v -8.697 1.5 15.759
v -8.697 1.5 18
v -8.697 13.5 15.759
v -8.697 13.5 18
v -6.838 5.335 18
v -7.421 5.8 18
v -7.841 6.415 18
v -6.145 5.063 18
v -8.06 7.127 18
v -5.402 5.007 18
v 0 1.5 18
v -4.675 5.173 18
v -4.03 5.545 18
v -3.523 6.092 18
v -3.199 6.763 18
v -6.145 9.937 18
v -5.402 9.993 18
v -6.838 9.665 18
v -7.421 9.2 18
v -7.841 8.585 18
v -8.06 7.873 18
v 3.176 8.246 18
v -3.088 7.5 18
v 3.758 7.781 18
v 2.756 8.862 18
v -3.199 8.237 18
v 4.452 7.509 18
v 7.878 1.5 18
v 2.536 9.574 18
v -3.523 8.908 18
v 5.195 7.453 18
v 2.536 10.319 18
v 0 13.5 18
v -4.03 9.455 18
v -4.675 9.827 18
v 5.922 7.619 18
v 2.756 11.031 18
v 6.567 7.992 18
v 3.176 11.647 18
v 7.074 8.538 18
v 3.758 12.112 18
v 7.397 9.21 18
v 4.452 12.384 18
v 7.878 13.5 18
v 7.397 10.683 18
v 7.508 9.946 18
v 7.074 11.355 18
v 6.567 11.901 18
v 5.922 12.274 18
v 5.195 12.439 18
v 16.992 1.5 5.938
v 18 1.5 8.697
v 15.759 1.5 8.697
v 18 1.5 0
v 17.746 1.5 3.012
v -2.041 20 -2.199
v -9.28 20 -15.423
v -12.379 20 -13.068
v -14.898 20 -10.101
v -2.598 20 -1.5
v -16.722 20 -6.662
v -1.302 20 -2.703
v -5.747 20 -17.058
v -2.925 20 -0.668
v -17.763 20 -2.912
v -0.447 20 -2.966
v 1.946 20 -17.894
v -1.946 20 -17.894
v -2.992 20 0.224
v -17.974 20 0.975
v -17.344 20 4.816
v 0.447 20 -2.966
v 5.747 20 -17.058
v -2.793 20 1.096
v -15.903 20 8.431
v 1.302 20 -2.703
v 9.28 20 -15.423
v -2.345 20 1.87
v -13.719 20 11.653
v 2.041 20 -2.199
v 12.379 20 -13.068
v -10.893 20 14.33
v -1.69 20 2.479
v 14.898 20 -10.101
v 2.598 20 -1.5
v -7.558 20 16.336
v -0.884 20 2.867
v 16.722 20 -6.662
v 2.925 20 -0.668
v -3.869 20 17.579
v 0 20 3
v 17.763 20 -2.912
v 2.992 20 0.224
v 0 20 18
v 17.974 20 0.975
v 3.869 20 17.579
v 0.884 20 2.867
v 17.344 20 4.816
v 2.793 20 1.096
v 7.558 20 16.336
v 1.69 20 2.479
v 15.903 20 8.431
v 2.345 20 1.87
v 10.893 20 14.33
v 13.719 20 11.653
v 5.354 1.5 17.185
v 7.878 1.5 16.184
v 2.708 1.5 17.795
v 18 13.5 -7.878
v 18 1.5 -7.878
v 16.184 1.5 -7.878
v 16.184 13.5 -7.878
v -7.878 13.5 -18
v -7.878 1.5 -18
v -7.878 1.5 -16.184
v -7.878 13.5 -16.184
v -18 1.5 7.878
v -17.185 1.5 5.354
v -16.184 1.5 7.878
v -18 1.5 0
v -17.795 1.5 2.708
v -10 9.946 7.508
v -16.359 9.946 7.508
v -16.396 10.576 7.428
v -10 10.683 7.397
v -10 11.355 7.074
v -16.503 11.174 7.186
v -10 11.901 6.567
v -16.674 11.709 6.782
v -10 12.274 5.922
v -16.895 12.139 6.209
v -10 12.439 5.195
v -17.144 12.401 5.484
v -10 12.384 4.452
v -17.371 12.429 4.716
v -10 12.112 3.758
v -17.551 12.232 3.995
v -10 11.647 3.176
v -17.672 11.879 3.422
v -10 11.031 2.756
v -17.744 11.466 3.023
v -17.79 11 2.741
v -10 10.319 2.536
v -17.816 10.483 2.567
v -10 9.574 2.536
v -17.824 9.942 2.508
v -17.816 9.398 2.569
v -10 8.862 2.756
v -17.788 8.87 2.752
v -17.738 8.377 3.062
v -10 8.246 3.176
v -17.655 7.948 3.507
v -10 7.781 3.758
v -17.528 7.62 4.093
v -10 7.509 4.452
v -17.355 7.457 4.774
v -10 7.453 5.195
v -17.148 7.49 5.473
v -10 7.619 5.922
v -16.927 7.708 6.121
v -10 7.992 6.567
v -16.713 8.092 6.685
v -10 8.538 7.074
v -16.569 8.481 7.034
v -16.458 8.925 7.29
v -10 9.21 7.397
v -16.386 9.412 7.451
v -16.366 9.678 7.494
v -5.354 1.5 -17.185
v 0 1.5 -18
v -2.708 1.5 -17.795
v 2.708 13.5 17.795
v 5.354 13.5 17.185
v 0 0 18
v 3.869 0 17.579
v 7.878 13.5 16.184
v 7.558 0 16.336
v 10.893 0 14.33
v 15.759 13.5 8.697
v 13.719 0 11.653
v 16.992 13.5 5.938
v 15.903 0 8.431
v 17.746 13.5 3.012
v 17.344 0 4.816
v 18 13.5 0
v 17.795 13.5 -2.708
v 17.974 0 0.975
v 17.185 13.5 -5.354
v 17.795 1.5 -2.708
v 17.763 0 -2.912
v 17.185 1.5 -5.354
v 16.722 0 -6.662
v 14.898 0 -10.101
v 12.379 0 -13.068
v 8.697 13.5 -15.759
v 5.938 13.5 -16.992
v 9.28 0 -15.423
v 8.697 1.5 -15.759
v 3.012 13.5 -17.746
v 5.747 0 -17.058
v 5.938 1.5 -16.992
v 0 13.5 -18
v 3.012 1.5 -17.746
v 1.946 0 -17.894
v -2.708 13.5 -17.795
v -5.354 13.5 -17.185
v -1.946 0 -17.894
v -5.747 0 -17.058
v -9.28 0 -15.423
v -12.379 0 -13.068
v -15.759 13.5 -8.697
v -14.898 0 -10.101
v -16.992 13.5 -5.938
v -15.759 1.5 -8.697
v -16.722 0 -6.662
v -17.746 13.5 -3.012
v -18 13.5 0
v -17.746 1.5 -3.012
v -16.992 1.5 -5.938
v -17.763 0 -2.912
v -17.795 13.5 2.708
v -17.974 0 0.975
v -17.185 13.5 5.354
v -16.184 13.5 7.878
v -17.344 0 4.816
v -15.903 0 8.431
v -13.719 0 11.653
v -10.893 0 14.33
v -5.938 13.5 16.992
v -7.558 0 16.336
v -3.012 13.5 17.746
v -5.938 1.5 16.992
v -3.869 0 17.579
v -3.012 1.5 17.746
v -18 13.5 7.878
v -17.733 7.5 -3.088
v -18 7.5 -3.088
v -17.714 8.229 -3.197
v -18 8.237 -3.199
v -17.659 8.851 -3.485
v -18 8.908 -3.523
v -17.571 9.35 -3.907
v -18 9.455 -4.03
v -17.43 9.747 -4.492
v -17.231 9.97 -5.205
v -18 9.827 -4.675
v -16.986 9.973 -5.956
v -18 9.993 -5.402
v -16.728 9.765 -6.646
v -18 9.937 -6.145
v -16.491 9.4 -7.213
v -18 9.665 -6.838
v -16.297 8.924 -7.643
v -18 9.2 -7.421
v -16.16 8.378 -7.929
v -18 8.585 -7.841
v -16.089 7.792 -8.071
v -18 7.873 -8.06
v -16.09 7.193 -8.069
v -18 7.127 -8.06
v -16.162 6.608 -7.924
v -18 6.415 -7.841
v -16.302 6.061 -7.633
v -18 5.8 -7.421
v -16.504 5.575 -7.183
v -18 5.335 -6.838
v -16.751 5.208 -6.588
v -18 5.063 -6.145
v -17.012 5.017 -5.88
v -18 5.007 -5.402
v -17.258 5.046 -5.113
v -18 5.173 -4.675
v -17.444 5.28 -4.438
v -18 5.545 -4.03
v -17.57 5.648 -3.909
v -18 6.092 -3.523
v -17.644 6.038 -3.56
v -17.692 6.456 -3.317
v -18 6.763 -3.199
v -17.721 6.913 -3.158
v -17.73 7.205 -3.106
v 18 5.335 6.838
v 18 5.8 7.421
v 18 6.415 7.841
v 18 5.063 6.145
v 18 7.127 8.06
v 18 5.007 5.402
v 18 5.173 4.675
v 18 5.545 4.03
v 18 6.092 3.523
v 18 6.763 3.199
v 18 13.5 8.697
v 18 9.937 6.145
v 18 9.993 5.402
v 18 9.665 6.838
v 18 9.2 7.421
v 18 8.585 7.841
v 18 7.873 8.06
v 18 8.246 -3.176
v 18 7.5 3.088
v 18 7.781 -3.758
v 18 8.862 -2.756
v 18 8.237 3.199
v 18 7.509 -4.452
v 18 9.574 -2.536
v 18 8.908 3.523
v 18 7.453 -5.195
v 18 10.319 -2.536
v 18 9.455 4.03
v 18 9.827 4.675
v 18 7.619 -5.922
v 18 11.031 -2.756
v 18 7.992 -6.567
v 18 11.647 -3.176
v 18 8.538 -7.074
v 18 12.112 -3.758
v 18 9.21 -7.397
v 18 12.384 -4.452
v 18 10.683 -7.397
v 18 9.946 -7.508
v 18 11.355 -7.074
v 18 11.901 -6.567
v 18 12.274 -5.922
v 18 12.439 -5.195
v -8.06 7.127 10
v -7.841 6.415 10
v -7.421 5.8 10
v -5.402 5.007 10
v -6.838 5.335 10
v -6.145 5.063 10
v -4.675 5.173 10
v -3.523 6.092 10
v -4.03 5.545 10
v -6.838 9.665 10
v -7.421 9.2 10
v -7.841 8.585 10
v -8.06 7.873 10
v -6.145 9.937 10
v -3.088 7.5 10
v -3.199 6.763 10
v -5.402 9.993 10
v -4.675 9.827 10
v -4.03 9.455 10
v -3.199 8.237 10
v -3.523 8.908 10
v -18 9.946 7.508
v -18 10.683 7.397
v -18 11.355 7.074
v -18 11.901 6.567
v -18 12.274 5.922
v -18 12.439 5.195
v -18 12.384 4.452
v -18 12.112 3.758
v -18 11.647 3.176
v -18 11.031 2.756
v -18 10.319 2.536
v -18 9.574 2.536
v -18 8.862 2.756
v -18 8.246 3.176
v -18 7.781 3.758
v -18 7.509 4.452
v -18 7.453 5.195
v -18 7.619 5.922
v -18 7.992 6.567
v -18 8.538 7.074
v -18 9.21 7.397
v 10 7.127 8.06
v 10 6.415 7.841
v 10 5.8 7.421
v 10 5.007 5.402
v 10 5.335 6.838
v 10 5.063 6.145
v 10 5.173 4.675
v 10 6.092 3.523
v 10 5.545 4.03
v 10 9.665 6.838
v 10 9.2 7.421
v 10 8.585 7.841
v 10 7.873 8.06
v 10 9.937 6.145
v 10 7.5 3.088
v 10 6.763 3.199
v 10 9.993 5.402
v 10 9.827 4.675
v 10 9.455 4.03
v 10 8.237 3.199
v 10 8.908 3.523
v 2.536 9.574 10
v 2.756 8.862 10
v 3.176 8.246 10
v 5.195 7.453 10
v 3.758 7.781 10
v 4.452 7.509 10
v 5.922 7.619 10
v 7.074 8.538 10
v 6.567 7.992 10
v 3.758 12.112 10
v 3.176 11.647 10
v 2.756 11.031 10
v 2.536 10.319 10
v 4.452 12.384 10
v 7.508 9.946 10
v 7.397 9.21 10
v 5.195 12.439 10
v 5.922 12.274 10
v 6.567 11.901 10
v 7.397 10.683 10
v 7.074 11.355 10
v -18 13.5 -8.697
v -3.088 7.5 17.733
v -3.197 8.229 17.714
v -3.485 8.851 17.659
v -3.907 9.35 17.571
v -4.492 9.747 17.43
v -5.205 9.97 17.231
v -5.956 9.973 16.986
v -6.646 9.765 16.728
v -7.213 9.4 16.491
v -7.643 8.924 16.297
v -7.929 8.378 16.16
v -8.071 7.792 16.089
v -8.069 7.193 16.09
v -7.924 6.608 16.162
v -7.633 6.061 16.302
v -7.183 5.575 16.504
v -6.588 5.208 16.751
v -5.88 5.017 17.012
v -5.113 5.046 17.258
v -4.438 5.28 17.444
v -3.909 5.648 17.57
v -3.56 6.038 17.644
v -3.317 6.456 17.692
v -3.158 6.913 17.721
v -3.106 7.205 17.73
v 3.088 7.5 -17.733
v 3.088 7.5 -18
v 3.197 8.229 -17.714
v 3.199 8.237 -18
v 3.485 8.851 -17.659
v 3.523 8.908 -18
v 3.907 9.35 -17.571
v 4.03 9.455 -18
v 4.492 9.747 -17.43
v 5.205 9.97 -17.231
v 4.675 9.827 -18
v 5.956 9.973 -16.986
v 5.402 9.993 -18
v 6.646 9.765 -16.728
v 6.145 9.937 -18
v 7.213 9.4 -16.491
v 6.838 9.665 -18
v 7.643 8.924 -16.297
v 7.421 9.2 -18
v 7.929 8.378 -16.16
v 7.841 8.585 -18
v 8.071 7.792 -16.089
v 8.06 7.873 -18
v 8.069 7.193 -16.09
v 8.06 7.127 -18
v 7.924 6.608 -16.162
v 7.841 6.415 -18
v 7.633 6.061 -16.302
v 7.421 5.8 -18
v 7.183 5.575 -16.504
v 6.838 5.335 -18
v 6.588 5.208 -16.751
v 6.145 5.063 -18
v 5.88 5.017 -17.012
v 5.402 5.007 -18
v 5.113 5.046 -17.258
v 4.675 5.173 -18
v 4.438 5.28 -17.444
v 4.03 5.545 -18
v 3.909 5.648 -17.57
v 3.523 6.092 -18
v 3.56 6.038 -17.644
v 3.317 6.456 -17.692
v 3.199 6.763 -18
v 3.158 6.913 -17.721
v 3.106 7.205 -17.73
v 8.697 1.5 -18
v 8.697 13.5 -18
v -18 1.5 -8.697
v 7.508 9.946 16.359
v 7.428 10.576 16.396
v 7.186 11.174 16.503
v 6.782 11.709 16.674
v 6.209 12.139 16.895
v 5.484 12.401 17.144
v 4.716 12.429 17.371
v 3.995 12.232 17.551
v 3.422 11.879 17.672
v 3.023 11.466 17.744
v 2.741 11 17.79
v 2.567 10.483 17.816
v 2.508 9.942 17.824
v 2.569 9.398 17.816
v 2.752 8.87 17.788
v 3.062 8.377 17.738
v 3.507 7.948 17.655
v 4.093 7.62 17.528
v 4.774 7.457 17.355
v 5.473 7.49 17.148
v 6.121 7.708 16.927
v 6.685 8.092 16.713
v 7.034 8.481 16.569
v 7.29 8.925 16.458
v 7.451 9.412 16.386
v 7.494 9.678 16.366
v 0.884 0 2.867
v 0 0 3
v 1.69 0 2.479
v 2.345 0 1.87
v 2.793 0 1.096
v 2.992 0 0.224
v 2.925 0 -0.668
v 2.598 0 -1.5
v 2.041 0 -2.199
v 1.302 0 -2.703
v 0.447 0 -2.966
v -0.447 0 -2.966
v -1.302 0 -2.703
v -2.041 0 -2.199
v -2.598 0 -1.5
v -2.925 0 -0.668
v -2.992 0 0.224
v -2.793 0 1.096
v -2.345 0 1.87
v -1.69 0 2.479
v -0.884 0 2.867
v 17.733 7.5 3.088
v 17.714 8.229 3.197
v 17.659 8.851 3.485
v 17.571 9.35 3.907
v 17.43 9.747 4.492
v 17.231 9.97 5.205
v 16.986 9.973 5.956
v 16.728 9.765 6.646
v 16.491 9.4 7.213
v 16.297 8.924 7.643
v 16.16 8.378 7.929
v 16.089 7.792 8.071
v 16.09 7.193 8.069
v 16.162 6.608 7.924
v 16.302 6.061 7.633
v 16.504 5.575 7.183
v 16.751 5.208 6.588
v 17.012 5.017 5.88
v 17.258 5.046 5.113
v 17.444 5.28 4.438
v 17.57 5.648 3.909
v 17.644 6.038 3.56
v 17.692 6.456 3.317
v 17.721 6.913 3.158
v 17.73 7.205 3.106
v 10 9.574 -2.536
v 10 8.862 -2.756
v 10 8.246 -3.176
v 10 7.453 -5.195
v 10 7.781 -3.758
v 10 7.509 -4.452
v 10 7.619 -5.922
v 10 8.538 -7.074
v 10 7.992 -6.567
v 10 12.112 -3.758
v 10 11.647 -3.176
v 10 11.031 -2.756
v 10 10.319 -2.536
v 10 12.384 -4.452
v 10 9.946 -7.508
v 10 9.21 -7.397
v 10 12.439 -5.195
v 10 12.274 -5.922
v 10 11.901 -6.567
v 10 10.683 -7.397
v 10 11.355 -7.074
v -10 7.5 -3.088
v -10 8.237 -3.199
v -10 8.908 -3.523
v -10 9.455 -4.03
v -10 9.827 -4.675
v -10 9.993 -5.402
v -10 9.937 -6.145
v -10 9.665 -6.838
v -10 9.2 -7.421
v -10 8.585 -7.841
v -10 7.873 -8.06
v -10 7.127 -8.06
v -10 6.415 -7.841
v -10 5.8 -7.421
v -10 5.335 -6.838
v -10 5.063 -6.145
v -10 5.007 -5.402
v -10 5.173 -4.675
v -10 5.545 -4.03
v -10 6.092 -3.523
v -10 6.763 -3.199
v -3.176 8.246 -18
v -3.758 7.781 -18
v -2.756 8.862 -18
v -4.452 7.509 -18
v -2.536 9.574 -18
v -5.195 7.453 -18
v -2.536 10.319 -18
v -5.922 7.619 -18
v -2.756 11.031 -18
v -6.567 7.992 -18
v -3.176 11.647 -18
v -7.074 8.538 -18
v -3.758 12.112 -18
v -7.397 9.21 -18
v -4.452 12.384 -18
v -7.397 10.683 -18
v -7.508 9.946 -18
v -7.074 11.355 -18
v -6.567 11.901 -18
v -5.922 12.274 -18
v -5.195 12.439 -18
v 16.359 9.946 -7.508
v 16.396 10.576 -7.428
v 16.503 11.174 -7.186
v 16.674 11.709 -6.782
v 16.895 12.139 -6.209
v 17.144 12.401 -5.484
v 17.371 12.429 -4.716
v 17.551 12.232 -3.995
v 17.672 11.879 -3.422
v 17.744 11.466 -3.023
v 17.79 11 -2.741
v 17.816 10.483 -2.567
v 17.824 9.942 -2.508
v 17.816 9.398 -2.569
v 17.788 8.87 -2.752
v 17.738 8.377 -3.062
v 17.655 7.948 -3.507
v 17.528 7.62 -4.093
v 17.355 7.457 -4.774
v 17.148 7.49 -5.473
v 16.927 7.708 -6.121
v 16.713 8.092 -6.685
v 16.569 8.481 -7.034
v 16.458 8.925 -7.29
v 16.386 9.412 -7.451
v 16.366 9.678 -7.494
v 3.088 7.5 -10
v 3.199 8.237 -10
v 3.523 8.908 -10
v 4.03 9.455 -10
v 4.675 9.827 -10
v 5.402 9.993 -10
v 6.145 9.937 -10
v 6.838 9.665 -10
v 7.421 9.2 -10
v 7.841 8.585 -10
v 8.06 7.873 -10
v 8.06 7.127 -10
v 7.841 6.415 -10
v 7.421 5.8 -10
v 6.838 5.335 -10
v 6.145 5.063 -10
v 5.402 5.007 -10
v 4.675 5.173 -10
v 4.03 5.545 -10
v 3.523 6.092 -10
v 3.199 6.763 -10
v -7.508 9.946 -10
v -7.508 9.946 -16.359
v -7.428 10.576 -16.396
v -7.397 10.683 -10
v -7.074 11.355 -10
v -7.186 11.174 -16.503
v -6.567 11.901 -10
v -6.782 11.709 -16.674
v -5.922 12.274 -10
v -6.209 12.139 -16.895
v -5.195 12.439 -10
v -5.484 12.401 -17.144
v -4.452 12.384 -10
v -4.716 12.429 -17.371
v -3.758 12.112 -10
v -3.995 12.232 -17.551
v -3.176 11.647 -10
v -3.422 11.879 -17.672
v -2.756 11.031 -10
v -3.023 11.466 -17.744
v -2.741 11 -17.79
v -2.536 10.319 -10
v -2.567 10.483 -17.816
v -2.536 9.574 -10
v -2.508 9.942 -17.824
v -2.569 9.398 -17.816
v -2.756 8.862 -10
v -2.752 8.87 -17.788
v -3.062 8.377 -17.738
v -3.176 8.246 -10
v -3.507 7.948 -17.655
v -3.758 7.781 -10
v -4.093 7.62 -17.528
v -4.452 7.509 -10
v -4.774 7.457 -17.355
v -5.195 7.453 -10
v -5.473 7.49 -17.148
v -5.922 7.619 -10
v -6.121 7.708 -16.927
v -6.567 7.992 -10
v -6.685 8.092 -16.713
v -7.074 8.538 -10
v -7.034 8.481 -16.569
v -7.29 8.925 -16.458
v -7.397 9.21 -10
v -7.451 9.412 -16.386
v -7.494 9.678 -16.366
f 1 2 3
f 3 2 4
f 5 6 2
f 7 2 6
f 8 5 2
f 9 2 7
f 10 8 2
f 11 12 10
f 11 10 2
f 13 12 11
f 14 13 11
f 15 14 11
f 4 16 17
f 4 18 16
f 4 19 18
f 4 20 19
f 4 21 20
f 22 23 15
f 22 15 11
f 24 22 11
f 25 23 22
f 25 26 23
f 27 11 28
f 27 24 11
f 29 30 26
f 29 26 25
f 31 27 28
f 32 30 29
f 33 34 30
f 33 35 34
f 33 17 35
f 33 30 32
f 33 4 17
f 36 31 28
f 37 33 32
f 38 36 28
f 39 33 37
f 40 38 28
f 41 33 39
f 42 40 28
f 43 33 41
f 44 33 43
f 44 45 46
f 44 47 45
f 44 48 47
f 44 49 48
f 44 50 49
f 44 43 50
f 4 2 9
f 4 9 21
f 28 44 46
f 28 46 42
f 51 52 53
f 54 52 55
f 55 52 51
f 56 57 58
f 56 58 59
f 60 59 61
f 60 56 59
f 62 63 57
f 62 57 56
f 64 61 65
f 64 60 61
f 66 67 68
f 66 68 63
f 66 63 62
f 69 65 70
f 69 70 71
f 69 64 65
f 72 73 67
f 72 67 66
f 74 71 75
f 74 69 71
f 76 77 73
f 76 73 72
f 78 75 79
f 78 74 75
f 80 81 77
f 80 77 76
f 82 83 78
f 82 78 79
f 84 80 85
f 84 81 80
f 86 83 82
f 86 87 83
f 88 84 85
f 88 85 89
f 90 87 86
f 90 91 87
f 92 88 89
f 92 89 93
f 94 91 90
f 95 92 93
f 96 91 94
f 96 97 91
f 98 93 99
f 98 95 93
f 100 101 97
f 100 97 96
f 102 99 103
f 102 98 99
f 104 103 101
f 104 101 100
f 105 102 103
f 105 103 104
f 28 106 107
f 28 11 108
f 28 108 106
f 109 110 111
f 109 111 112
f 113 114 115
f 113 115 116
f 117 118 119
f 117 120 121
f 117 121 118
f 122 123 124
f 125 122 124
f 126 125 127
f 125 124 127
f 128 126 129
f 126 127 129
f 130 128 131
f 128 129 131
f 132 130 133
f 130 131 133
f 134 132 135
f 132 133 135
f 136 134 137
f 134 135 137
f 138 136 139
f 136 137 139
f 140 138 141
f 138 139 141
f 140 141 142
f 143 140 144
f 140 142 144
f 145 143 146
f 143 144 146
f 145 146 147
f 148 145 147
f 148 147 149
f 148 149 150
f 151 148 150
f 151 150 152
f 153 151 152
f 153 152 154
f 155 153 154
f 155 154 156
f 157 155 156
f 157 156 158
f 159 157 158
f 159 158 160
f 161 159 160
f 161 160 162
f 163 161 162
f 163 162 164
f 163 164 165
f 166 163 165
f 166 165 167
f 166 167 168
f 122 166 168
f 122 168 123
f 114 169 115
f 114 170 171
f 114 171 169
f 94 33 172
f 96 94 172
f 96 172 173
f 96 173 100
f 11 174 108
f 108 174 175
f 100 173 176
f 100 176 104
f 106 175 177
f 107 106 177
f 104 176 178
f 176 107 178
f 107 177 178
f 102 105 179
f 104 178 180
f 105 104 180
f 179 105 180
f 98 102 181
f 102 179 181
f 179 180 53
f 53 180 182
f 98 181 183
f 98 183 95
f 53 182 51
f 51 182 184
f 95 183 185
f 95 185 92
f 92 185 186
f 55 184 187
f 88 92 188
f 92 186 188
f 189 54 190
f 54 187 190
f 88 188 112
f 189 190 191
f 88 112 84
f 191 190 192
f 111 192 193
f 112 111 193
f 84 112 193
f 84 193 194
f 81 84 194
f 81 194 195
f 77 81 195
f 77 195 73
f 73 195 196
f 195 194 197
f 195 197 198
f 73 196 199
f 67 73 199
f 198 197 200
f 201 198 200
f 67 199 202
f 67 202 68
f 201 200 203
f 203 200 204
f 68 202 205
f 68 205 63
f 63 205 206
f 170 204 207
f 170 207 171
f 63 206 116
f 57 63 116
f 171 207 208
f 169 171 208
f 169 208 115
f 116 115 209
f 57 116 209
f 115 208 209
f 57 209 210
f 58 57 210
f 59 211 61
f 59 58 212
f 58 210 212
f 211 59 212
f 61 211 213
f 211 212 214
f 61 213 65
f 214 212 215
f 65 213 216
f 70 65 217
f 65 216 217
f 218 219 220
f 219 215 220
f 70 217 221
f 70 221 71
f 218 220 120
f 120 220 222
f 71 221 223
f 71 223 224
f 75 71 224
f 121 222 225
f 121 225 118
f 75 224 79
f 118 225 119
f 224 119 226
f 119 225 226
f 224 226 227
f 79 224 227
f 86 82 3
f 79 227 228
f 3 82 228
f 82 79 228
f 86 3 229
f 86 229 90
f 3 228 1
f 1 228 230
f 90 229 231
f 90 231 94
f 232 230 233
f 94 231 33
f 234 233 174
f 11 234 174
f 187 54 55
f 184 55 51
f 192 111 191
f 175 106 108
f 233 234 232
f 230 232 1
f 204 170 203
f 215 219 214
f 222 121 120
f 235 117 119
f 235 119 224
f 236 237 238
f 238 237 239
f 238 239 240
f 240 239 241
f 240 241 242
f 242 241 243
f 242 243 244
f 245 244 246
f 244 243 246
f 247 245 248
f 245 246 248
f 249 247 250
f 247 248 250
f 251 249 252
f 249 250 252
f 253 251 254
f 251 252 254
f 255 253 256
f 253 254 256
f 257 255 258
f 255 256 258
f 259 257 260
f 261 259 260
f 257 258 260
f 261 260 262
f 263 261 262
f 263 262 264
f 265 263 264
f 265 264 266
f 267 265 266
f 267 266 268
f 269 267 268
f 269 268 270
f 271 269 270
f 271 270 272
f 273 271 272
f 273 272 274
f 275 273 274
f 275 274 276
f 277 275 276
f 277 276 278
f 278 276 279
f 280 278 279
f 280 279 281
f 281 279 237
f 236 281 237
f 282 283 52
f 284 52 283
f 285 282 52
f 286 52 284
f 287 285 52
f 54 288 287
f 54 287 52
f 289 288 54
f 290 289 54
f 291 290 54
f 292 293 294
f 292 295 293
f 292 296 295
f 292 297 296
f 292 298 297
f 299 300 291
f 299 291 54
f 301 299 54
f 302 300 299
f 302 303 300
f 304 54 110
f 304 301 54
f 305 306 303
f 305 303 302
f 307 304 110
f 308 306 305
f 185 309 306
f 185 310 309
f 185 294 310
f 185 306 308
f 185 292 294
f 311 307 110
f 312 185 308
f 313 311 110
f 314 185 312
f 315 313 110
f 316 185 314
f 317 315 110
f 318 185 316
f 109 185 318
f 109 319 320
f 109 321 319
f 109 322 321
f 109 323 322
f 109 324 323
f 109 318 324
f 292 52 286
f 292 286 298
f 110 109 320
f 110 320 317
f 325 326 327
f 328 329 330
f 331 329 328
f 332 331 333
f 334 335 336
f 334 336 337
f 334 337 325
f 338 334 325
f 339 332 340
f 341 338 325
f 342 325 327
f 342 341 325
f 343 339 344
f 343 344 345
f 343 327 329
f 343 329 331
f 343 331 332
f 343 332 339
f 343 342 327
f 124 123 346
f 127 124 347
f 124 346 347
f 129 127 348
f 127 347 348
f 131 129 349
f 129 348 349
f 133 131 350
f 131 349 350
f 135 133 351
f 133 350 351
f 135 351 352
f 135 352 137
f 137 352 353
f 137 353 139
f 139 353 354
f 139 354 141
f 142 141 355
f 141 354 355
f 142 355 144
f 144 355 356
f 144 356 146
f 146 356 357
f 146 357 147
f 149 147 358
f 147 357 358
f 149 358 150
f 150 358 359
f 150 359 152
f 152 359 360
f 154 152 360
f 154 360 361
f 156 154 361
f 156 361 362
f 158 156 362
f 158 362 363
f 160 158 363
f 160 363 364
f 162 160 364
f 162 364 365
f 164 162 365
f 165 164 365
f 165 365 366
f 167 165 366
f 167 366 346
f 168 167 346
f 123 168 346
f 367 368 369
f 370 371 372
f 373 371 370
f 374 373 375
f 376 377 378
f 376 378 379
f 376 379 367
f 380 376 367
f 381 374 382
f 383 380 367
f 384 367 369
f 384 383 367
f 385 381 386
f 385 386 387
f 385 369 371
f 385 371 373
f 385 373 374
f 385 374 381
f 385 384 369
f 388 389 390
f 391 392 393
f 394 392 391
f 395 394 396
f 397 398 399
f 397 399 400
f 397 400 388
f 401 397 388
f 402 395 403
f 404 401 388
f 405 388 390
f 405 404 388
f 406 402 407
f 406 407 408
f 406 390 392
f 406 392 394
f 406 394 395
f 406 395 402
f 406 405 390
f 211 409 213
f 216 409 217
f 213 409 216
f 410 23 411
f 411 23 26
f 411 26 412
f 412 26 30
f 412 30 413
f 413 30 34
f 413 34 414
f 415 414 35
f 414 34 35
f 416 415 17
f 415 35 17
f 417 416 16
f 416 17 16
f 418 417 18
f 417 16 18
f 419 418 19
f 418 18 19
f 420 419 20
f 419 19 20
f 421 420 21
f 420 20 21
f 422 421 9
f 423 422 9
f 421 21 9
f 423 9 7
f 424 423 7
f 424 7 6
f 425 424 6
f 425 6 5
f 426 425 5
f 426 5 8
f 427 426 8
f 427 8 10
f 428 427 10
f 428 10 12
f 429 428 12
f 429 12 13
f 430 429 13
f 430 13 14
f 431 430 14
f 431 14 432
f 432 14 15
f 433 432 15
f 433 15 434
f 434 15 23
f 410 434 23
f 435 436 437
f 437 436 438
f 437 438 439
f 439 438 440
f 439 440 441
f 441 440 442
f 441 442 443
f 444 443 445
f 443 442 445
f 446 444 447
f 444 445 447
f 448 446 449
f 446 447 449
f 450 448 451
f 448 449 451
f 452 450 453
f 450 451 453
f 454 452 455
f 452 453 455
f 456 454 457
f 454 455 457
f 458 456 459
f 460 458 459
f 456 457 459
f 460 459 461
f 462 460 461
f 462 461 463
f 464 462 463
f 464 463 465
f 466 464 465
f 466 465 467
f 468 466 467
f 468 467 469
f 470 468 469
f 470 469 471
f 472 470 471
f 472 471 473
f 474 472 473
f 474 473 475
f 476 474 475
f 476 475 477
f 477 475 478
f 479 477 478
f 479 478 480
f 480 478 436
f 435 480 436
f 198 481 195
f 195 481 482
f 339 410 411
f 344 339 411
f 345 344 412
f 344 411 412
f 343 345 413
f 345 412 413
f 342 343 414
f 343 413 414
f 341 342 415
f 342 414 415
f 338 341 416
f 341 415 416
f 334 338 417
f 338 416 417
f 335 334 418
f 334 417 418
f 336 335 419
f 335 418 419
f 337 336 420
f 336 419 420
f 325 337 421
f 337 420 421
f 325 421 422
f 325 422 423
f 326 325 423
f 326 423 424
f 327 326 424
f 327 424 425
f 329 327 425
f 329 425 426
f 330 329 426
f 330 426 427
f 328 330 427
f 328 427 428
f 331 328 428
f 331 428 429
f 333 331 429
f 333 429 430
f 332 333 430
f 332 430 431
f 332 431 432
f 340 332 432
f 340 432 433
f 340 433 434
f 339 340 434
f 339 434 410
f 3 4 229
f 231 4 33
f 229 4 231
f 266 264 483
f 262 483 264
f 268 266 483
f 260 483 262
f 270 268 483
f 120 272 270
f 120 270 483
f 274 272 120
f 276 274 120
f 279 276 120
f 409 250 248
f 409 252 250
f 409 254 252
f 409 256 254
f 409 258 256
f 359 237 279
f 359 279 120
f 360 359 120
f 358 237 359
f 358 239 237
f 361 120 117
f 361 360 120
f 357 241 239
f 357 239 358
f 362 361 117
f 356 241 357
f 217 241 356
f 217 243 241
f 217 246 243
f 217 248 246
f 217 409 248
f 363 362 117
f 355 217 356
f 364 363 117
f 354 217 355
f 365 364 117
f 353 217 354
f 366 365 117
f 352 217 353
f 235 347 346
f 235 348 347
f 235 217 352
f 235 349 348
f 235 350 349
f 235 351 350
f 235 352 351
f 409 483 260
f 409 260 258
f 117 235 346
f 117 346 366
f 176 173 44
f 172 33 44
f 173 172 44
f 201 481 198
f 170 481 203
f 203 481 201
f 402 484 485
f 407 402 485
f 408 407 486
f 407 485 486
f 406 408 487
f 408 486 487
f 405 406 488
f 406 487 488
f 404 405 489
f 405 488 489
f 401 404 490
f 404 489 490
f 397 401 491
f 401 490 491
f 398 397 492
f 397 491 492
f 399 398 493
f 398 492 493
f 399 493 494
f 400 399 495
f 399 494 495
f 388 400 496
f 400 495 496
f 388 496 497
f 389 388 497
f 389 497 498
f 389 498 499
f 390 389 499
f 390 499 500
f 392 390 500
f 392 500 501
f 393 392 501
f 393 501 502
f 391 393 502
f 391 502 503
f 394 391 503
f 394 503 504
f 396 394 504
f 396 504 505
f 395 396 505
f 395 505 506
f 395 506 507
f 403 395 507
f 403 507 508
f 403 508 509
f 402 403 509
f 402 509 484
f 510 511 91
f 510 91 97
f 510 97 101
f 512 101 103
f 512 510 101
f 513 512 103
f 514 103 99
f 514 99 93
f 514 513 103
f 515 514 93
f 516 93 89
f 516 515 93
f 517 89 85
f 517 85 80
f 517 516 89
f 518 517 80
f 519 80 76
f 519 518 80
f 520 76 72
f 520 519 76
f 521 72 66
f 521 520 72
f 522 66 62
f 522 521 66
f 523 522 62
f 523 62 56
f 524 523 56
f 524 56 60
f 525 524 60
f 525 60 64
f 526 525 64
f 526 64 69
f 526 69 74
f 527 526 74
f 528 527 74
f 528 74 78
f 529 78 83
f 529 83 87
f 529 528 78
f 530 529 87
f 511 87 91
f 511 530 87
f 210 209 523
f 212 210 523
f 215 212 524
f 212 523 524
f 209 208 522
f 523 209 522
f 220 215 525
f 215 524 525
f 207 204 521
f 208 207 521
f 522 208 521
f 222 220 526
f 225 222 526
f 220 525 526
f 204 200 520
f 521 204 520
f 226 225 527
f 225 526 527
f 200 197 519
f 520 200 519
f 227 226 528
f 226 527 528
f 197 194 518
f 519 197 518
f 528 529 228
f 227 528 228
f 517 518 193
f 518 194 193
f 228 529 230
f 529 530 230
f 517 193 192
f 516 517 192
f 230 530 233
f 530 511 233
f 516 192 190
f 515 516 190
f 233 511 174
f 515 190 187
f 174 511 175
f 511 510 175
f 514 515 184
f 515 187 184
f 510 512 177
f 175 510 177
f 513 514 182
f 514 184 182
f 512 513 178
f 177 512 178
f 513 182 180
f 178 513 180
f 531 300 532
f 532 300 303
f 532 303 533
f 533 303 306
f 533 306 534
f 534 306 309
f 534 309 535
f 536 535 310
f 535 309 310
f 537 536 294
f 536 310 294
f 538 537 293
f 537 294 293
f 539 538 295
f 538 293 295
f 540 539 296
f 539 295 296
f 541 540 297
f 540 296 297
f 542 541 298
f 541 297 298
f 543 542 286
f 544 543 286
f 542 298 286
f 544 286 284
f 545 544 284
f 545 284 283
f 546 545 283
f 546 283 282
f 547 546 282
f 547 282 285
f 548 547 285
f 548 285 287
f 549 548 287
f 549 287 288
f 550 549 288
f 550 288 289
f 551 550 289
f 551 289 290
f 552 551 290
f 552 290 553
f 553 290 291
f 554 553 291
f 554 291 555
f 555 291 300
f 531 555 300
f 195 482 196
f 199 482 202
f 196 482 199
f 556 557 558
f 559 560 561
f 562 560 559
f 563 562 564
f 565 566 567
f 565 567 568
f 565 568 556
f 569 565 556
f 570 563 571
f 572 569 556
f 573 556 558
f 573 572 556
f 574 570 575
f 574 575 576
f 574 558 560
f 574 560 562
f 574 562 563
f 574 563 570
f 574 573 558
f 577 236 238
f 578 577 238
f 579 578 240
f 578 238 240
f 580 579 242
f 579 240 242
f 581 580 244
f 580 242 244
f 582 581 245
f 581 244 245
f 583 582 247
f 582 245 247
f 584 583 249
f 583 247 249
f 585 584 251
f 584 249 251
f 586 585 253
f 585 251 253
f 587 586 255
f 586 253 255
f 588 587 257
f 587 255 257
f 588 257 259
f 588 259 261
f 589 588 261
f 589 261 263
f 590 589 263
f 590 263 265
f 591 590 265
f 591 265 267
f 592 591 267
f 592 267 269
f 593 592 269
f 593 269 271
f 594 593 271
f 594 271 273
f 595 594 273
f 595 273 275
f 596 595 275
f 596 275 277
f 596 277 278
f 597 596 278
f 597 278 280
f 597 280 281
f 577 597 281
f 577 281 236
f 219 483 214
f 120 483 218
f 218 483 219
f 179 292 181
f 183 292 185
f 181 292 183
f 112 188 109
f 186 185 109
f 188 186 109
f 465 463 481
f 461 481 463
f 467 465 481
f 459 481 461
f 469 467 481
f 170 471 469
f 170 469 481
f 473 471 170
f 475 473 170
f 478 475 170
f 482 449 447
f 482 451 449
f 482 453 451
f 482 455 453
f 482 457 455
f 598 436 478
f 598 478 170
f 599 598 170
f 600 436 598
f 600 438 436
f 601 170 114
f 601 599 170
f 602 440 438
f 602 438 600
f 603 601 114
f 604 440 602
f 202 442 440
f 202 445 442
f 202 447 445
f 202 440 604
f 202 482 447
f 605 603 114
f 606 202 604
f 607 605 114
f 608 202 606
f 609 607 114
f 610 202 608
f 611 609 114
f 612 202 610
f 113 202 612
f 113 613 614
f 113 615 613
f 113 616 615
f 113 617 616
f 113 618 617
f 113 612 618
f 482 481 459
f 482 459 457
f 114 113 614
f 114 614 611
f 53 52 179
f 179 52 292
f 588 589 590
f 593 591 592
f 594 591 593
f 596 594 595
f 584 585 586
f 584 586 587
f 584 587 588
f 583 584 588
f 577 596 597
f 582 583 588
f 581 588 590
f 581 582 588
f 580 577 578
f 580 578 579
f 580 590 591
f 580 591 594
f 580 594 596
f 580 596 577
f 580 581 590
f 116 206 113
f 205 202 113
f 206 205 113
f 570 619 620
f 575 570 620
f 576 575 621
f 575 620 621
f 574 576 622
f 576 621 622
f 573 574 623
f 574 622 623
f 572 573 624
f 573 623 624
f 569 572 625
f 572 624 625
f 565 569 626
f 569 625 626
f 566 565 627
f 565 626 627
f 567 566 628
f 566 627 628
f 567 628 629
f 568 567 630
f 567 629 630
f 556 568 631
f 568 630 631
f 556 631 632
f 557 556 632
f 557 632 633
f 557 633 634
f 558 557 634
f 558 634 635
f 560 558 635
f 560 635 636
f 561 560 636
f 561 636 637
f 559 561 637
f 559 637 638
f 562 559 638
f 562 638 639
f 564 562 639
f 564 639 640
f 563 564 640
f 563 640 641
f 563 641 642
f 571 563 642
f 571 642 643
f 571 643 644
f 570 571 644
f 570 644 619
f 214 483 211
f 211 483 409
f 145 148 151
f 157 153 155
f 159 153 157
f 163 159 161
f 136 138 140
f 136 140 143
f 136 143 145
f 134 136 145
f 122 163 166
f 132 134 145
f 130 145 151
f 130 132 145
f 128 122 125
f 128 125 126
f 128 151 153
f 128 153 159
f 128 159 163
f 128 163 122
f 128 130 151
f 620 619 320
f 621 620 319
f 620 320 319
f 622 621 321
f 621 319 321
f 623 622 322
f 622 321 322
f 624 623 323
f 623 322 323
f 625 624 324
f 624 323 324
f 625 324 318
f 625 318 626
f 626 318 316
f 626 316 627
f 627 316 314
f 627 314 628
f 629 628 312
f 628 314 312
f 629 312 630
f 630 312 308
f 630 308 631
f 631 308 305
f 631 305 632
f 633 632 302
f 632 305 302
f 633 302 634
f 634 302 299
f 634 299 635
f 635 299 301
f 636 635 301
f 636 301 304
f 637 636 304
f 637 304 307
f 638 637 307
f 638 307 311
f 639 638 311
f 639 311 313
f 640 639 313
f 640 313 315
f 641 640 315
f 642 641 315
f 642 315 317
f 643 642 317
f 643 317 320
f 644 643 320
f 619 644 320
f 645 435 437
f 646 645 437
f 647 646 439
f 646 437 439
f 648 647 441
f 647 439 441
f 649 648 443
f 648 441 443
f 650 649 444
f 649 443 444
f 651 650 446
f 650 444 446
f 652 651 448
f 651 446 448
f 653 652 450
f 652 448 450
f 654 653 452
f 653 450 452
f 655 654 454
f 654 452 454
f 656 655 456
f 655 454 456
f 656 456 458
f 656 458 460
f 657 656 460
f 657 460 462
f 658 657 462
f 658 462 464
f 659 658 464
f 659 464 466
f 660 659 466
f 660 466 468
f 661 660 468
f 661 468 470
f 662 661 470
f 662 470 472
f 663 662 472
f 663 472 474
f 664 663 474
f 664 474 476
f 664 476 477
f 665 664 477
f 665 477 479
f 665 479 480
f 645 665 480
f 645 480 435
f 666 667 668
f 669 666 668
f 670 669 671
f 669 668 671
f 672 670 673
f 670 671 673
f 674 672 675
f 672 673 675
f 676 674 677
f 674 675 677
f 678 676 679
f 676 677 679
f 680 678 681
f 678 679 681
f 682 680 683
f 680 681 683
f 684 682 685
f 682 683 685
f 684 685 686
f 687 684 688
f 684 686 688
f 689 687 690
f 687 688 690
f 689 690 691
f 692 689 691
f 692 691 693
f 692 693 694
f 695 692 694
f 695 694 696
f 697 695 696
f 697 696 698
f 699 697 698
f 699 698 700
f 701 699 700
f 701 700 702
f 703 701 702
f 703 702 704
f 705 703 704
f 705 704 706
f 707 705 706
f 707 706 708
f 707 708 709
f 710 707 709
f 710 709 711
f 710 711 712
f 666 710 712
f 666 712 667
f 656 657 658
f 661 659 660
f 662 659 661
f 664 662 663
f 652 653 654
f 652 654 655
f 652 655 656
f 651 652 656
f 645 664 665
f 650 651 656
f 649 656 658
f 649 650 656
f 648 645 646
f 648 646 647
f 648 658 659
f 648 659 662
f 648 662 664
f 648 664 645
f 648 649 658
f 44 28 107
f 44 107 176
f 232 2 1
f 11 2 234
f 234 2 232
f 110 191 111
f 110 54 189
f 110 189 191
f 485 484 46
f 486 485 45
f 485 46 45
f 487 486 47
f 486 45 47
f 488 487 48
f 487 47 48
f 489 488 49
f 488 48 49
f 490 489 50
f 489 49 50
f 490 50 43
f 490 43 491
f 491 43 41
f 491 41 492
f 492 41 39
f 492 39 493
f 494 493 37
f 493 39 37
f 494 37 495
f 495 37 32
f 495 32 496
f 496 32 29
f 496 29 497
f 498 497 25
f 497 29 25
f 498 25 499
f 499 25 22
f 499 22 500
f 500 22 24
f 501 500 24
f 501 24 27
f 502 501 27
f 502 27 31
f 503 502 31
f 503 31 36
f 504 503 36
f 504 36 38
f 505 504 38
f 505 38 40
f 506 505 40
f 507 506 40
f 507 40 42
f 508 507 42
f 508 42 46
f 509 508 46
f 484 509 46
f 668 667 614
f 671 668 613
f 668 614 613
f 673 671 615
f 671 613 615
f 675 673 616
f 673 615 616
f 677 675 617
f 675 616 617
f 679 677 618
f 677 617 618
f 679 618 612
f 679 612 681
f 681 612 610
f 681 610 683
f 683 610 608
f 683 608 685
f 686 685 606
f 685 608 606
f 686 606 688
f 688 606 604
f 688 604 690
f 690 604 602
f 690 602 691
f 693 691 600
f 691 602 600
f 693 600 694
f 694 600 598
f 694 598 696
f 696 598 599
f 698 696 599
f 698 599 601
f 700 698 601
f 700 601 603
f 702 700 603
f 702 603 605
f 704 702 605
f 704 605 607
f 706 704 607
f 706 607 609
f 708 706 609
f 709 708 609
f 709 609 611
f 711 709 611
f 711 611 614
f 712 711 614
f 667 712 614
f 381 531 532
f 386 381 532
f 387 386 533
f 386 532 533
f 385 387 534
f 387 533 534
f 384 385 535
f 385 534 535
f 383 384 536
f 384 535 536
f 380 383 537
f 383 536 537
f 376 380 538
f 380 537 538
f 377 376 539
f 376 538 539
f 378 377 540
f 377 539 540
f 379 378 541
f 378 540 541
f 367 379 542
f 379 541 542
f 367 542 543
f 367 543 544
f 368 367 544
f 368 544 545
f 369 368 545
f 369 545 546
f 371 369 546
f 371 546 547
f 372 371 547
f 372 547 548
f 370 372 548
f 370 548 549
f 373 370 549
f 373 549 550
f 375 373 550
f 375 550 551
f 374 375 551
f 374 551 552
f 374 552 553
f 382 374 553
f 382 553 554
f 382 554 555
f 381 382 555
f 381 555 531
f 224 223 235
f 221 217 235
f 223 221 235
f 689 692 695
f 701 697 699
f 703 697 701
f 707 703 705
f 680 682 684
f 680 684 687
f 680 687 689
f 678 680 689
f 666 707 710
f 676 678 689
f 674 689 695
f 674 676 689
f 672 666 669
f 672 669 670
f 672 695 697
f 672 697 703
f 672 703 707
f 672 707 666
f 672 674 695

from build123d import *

# Parameters (mm, degrees)
ESQUISSE1_R                  = 18
ESQUISSE1_R_2                = 3
BOSS_EXTRU_1_DEPTH           = 20
BOSS_EXTRU_2_REACH           = 46.944
BOSS_EXTRU_2_END_RADIUS      = 18
ESQUISSE2_W                  = 16.575364331
ESQUISSE2_H                  = 12
ESQUISSE2_R                  = 2.5
ESQUISSE3_R                  = 2.5
ENL_V_MAT_EXTRU_1_DEPTH      = 8
R_P_TITION_CIRCULAIRE1_COUNT = 4


with BuildPart() as part:
    # Esquisse1 → Boss.-Extru.1 (new body)
    with BuildSketch(Plane(origin=(0, 0, 0), x_dir=(1, 0, 0), z_dir=(0, 1, 0))):
        with Locations(Location((0, 0, 0), (0, 0, 270))):
            Circle(ESQUISSE1_R)
        with Locations(Location((0, 0, 0), (0, 0, 270))):
            Circle(ESQUISSE1_R_2, mode=Mode.SUBTRACT)
    extrude(amount=BOSS_EXTRU_1_DEPTH)

    # Boss.-Extru.2: up to this cylinder (the profile starts outside it)
    boss_extru_2_end = Plane(origin=(0, 7.199085, 0), z_dir=(0, -1, 0)) * Cylinder(BOSS_EXTRU_2_END_RADIUS, 130.888, mode=Mode.PRIVATE)
    # Esquisse2 → Boss.-Extru.2 (add, up to the surface)
    with BuildSketch(Plane.ZY.offset(18), mode=Mode.PRIVATE) as boss_extru_2_sk1:
        with Locations((-0.409721573, 7.5)):
            Rectangle(ESQUISSE2_W, ESQUISSE2_H)
        with Locations((-5.58835764, 7.5)):
            Circle(ESQUISSE2_R, mode=Mode.SUBTRACT)
        with Locations((5.008479737, 9.946472677)):
            Circle(ESQUISSE2_R, mode=Mode.SUBTRACT)
    boss_extru_2_tool1 = extrude(boss_extru_2_sk1.sketch, amount=-BOSS_EXTRU_2_REACH, mode=Mode.PRIVATE) - boss_extru_2_end
    boss_extru_2 = boss_extru_2_tool1.solids().sort_by_distance((-18, 7.199085, -0.439188))[0] + boss_extru_2_tool1.solids().sort_by_distance((-18, 7.199085, -0.439188))[1]
    add(boss_extru_2)

    # Esquisse3 → Enlèv. mat.-Extru.1 (cut)
    with BuildSketch(Plane.ZY.offset(18)):
        with Locations((5.008479737, 9.946472677)):
            Circle(ESQUISSE3_R)
        with Locations((-5.58835764, 7.5)):
            Circle(ESQUISSE3_R)
    enl_v_mat_extru_1 = extrude(amount=-ENL_V_MAT_EXTRU_1_DEPTH, mode=Mode.SUBTRACT)

    # Répétition circulaire1: Boss.-Extru.2, Enlèv. mat.-Extru.1 ×4 about axis
    r_p_tition_circulaire1_axis = Axis((0, 0, 0), (0, 1, 0))
    add([boss_extru_2.rotate(r_p_tition_circulaire1_axis, i * 360 / R_P_TITION_CIRCULAIRE1_COUNT) for i in range(1, R_P_TITION_CIRCULAIRE1_COUNT)])
    add([enl_v_mat_extru_1.rotate(r_p_tition_circulaire1_axis, i * 360 / R_P_TITION_CIRCULAIRE1_COUNT) for i in range(1, R_P_TITION_CIRCULAIRE1_COUNT)], mode=Mode.SUBTRACT)


solid = part.part
